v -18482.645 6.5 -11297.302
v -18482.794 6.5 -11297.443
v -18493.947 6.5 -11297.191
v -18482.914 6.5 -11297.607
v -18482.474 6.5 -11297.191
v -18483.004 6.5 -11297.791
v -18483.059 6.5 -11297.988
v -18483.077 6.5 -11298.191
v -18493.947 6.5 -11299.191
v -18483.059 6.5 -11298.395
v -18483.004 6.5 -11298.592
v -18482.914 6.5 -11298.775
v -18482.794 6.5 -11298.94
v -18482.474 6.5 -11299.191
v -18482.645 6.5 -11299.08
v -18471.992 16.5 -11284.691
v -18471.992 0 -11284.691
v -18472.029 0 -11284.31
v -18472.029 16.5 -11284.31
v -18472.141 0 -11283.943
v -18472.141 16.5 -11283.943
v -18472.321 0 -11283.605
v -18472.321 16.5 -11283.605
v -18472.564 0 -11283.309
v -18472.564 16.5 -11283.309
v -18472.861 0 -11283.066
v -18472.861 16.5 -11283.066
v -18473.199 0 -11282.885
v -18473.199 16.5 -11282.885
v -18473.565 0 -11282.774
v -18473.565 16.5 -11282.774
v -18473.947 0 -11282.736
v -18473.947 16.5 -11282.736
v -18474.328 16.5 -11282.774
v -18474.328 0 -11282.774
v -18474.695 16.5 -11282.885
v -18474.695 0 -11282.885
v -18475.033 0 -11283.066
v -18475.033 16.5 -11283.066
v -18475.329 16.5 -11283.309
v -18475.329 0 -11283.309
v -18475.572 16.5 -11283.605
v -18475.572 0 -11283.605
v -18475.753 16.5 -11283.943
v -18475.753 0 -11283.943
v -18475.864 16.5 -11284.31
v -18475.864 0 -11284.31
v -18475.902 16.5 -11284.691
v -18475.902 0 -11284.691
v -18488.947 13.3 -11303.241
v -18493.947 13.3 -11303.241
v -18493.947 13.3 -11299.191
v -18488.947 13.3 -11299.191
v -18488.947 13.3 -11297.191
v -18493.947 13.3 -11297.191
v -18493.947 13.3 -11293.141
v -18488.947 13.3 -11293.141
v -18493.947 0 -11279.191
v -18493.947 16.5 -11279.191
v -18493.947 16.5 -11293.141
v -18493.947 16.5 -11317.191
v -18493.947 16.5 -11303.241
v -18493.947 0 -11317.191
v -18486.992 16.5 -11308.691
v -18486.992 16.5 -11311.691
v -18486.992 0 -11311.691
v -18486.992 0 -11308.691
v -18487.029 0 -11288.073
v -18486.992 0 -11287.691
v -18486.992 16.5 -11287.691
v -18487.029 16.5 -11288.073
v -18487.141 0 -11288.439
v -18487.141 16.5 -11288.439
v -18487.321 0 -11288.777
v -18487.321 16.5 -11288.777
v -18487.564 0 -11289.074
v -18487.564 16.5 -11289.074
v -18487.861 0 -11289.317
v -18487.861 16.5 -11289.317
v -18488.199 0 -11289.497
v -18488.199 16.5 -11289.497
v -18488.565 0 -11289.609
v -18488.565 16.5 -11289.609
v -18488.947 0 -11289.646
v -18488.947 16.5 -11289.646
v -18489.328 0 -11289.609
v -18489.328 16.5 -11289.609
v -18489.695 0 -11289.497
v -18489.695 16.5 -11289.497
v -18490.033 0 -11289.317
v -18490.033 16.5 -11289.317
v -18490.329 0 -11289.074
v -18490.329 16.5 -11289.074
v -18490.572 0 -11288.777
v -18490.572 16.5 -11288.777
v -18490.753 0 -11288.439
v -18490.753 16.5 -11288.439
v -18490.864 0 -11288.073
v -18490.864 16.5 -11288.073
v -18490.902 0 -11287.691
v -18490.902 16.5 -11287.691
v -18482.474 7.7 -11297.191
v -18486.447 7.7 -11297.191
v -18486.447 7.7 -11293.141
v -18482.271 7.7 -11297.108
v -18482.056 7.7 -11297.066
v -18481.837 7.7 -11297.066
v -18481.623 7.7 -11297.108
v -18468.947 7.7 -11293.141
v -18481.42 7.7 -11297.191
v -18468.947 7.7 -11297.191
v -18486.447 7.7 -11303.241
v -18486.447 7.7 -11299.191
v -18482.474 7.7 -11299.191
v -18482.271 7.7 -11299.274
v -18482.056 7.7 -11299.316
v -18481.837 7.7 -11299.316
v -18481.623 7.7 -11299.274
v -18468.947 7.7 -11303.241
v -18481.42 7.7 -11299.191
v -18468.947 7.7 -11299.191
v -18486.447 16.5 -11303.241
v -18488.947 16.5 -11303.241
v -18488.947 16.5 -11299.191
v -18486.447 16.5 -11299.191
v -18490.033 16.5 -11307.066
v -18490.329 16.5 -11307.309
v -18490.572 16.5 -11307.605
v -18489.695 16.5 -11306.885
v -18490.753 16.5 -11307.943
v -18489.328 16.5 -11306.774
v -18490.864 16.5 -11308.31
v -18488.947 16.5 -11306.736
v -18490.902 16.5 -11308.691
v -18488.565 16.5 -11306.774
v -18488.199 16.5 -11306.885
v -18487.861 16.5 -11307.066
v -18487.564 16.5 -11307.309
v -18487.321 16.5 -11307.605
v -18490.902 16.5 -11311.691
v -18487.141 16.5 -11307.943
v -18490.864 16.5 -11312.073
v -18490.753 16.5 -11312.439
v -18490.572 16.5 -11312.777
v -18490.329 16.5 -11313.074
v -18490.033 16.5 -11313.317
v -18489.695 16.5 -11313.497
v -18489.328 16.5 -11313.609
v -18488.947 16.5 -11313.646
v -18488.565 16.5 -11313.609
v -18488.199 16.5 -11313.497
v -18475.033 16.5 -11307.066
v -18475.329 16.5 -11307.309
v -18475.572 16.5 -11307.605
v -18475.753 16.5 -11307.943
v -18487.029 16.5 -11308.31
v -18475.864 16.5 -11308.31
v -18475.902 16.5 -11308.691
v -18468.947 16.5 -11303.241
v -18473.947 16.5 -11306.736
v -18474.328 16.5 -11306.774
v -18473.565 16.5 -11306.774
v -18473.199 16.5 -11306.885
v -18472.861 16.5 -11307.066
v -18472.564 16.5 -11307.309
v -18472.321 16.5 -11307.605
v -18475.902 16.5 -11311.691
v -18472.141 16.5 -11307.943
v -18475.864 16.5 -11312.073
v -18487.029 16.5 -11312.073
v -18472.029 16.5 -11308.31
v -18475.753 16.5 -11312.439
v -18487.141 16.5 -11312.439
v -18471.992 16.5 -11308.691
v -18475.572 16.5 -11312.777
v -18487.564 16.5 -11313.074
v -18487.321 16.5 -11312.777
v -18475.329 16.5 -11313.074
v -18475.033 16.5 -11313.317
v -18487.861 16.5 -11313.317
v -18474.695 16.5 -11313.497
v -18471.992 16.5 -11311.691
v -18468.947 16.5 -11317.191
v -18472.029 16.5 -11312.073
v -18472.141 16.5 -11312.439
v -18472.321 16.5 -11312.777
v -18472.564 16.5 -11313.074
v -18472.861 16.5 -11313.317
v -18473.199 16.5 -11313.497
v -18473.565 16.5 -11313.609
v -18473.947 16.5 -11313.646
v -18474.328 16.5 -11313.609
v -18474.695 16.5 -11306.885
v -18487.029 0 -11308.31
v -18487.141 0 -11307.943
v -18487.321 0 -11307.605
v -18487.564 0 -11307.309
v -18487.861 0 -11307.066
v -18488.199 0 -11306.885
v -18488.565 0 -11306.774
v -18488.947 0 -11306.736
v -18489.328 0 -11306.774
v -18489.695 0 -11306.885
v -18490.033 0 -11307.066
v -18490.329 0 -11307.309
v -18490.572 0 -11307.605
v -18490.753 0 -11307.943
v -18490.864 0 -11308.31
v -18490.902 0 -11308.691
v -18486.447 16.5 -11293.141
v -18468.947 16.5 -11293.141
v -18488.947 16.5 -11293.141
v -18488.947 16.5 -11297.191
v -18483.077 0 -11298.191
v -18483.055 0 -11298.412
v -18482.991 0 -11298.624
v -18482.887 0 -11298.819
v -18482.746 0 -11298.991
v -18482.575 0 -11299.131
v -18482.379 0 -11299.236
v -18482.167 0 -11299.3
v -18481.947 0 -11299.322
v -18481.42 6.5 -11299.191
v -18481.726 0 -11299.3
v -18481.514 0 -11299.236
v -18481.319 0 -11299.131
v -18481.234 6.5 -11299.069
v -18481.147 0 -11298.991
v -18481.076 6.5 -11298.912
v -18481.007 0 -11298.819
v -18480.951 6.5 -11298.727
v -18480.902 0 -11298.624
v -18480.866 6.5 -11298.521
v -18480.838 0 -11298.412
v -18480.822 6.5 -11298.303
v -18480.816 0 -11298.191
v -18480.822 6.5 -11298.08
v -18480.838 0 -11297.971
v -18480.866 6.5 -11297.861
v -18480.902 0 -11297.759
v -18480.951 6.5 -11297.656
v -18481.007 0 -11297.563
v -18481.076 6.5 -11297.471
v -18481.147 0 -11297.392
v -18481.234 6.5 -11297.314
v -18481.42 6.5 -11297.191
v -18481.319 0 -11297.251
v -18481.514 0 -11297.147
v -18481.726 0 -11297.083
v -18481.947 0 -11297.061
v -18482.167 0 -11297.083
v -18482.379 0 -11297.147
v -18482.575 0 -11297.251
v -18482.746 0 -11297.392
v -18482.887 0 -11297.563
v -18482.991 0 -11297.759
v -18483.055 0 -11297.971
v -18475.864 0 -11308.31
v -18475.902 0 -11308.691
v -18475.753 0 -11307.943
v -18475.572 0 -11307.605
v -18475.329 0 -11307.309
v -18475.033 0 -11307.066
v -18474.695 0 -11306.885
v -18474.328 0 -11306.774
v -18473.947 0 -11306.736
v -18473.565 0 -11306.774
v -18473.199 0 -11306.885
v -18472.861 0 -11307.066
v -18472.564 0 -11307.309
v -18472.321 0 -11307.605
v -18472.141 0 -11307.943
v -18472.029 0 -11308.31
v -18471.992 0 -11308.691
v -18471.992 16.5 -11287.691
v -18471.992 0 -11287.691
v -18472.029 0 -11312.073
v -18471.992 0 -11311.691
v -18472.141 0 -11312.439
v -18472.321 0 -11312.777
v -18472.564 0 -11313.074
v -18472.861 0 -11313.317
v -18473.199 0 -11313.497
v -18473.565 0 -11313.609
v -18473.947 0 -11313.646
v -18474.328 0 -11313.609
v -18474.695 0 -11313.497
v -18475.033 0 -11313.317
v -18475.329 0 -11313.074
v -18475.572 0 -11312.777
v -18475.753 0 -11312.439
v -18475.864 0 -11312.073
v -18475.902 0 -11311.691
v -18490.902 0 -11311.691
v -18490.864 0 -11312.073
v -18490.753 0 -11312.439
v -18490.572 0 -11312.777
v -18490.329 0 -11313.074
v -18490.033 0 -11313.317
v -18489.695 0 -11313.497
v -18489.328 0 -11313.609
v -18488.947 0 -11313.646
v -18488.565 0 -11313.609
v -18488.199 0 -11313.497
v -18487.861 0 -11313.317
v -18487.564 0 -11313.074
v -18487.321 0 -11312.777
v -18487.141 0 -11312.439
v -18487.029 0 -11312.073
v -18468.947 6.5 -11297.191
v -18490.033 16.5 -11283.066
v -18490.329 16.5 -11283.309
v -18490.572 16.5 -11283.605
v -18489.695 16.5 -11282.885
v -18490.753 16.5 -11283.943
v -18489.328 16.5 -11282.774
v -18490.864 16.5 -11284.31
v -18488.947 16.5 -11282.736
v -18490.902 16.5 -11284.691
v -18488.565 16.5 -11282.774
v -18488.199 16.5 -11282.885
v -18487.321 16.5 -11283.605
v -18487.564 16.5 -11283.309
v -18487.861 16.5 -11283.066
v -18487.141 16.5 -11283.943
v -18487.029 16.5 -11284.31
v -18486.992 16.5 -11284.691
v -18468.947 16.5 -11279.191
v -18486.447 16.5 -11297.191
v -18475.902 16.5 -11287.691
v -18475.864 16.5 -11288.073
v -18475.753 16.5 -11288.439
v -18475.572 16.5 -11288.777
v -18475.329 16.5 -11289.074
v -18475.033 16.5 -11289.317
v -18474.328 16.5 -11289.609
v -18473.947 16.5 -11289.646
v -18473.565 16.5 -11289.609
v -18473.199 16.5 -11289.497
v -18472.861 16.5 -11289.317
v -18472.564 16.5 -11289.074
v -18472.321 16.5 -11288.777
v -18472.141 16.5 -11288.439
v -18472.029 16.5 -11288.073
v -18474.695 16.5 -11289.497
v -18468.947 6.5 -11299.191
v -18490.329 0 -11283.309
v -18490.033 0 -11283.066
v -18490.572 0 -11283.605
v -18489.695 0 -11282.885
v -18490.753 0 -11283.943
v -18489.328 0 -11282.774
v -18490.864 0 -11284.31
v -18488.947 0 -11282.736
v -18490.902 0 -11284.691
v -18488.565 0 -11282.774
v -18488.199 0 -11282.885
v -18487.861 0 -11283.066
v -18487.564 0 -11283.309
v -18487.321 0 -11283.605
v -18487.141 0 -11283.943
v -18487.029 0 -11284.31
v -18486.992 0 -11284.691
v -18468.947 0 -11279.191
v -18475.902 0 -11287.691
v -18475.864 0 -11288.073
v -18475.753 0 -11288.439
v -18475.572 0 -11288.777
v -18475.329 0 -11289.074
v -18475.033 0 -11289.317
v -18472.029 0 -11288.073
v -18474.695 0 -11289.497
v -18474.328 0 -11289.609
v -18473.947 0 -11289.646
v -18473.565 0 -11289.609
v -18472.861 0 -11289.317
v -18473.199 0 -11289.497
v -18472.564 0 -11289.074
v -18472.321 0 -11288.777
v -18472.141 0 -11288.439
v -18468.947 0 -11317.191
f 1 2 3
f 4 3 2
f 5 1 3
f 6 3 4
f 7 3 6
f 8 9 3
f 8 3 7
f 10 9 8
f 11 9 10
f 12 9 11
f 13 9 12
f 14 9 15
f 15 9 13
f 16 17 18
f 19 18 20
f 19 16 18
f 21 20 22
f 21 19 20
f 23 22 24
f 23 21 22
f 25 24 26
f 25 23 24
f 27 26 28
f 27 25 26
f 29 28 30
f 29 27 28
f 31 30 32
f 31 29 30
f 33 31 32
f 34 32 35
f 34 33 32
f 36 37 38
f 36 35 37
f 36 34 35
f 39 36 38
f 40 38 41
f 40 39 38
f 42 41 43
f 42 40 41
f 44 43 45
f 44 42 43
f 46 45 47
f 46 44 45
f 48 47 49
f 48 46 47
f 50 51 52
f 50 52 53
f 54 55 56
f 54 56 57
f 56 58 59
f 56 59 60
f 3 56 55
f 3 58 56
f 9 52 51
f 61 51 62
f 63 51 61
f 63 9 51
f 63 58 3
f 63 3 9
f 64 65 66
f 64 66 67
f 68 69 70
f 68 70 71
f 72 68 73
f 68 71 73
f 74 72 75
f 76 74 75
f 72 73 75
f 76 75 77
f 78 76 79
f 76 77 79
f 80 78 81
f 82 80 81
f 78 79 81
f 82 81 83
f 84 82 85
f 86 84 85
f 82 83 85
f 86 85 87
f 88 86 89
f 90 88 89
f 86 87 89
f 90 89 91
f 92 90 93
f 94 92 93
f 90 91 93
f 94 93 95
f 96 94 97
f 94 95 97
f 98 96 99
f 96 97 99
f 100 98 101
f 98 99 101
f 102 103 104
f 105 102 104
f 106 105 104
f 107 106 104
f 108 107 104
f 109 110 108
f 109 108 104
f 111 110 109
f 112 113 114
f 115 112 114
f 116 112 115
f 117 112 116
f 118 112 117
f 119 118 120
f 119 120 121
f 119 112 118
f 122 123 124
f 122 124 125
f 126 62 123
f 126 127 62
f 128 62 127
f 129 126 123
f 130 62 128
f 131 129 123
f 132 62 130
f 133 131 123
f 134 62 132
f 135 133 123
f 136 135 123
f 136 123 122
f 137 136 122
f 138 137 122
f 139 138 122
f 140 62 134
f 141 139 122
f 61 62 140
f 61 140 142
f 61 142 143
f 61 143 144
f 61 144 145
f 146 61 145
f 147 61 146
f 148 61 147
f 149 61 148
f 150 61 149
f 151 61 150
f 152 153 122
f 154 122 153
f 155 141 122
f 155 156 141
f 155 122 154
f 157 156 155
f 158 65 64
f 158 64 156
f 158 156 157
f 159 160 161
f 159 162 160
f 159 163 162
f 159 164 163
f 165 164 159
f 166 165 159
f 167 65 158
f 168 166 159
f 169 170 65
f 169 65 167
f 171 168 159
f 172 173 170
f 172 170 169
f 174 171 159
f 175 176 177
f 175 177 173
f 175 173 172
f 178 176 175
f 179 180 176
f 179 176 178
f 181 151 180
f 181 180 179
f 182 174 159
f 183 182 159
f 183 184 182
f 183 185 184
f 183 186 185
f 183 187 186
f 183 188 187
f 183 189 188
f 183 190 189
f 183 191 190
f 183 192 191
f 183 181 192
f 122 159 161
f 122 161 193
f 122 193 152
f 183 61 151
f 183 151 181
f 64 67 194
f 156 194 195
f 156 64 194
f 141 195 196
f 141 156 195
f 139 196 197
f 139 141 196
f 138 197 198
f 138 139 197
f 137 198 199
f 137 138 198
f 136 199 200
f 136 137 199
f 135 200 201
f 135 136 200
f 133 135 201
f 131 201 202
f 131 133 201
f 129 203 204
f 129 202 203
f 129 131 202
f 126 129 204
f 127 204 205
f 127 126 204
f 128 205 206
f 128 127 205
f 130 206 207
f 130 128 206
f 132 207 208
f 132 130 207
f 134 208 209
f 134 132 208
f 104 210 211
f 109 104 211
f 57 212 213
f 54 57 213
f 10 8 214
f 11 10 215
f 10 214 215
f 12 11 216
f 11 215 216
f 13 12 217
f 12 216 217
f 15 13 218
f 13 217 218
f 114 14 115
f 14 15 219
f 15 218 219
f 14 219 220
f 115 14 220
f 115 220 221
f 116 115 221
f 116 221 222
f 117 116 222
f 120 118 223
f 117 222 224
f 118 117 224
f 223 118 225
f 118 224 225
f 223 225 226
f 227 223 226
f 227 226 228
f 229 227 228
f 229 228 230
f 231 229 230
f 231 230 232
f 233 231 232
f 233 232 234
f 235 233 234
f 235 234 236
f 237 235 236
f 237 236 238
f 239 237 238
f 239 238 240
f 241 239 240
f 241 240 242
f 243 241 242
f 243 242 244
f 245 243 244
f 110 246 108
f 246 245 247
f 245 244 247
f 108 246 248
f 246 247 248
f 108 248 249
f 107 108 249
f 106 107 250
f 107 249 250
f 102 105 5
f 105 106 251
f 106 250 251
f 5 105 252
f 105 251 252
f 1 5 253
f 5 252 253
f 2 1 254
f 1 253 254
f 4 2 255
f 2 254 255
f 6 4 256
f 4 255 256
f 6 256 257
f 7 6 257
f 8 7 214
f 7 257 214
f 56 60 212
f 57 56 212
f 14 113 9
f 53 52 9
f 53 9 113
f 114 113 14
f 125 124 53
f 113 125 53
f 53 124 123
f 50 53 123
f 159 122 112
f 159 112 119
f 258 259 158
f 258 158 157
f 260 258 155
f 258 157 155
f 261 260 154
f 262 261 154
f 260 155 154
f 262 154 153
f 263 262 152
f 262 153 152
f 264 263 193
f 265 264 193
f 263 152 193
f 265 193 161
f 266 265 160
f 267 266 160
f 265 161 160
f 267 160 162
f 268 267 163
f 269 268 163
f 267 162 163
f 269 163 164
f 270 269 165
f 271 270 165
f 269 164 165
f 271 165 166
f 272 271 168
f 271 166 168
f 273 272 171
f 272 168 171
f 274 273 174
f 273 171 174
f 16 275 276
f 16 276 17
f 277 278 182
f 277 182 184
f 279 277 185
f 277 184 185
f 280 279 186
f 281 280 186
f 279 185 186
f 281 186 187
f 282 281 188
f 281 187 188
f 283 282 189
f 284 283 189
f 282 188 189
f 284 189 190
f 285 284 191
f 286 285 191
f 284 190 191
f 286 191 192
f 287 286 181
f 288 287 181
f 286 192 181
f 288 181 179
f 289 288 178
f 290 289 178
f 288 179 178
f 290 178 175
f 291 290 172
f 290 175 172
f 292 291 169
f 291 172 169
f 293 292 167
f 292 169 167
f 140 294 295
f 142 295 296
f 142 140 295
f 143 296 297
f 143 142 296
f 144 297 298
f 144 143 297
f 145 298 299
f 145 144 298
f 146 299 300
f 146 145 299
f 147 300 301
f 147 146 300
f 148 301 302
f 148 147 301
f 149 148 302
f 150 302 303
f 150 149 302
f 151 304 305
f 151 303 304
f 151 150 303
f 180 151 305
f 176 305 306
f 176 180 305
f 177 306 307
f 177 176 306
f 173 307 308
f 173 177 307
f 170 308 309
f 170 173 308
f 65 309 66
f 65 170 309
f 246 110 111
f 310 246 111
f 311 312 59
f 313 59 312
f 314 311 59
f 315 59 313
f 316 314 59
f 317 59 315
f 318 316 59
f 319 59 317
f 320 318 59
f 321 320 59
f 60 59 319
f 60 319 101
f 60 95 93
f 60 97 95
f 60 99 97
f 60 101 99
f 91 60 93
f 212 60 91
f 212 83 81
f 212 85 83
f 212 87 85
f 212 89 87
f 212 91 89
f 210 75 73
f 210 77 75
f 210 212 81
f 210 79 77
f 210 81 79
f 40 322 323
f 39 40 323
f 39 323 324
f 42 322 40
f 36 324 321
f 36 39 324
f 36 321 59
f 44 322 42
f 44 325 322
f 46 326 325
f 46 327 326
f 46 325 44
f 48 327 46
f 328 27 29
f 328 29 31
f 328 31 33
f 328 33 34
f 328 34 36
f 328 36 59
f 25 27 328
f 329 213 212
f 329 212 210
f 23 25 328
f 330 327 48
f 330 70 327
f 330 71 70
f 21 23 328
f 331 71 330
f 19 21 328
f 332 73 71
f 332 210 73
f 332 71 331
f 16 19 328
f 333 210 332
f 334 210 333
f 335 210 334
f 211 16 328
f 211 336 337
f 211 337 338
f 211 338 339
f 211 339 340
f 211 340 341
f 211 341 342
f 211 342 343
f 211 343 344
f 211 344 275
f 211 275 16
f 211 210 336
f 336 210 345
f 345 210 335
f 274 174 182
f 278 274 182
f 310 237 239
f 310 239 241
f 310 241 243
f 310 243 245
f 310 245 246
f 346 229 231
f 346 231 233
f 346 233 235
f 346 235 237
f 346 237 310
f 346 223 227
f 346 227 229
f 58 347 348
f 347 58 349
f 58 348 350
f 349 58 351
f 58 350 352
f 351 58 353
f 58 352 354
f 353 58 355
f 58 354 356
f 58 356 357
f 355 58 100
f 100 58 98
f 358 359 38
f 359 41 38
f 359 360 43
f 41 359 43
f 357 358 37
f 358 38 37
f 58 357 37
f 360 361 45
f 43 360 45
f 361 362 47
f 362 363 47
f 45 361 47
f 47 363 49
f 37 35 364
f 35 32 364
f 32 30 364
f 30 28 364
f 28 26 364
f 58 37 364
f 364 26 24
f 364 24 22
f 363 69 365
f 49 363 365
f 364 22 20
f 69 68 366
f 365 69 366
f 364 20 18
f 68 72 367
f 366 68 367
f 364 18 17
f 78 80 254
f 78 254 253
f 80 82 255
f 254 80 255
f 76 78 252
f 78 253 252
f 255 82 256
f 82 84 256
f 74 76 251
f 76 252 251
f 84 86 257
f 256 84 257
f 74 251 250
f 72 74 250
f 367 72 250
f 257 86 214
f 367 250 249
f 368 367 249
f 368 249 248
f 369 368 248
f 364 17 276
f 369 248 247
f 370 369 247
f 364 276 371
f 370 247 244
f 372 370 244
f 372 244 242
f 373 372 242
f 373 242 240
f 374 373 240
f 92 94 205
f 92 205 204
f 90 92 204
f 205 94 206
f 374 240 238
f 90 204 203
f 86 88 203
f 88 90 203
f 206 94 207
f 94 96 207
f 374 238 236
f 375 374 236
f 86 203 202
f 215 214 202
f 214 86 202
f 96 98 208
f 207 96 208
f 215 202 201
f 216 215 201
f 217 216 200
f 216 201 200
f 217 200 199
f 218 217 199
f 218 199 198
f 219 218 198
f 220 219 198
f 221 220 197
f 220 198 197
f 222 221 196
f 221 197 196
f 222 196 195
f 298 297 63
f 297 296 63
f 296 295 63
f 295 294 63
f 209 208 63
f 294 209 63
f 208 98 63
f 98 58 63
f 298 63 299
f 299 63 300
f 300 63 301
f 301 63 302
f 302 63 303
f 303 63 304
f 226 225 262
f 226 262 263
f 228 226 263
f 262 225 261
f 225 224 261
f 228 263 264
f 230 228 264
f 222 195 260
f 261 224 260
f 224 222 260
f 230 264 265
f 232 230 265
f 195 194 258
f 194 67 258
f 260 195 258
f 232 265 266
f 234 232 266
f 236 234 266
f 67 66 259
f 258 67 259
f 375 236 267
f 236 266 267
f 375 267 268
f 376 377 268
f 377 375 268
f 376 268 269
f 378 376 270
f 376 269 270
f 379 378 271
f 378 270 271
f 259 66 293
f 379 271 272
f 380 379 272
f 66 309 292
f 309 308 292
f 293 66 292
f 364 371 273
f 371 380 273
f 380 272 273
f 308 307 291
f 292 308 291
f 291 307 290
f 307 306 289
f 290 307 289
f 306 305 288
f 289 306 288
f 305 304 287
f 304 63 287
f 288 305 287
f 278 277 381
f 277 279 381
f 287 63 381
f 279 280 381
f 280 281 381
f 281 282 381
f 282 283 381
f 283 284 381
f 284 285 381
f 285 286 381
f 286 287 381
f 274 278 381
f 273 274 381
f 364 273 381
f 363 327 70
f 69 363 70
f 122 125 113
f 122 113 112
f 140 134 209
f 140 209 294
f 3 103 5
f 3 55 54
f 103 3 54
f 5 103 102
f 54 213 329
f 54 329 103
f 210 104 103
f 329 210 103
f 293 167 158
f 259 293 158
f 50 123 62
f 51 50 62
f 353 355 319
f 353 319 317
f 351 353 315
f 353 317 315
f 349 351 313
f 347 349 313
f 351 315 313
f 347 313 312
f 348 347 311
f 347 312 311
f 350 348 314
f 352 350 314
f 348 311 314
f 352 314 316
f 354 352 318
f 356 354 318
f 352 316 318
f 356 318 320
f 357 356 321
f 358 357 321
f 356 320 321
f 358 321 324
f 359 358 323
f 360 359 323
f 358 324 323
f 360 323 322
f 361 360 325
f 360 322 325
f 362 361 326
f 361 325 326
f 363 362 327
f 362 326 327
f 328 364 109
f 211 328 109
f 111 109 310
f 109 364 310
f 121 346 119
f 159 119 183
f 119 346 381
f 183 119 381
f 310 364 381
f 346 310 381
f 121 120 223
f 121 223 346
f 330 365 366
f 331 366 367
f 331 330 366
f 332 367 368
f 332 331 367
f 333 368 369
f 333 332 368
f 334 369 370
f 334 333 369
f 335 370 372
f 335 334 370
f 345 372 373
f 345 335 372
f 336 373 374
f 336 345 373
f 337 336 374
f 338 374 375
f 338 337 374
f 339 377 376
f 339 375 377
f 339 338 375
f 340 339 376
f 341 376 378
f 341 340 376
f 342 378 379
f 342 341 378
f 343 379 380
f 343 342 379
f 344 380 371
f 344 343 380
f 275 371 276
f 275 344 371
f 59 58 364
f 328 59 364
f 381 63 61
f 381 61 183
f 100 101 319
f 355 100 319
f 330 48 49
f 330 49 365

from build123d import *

# Parameters (mm, degrees)
SKETCH1_W               = 25
SKETCH1_H               = 38
BOSS_EXTRUDE1_DEPTH     = 16.5
F_6_32_SLOTS_DEPTH      = 17.5
SKETCH2_11_W            = 5
SKETCH2_11_H            = 5.05
LENS_SEAT_DEPTH         = 3.2
SKETCH2_13_W            = 17.5
SKETCH2_13_H            = 10.1
LENS_PLATE_GROOVE_DEPTH = 8.8
SKETCH6_W               = 25
SKETCH6_H               = 2
ALIGNMENT_GROOVE_DEPTH  = 10
F_4_40_TAPPED_HOLE2_D   = 2.2606


with BuildPart() as part:
    # Sketch1 → Boss-Extrude1 (new body)
    with BuildSketch(Plane(origin=(0, 0, 0), x_dir=(1, 0, 0), z_dir=(0, 1, 0))):
        with Locations((-18481.446731235, 11298.191283293)):
            Rectangle(SKETCH1_W, SKETCH1_H)
    extrude(amount=BOSS_EXTRUDE1_DEPTH)

    # Sketch2 → 6-32 slots (cut, through all)
    with BuildSketch(Plane(origin=(0, 16.5, 0), x_dir=(1, 0, 0), z_dir=(0, 1, 0))):
        with BuildLine():
            Line((-18486.991731235, 11311.691283293), (-18486.991731235, 11308.691283293))
            ThreePointArc((-18486.991731235, 11308.691283293), (-18488.946731235, 11306.736283293), (-18490.901731235, 11308.691283293))
            Line((-18490.901731235, 11308.691283293), (-18490.901731235, 11311.691283293))
            ThreePointArc((-18490.901731235, 11311.691283293), (-18488.946731235, 11313.646283293), (-18486.991731235, 11311.691283293))
        make_face()
        with BuildLine():
            Line((-18486.991731235, 11284.691283293), (-18486.991731235, 11287.691283293))
            ThreePointArc((-18486.991731235, 11287.691283293), (-18488.946731235, 11289.646283293), (-18490.901731235, 11287.691283293))
            Line((-18490.901731235, 11287.691283293), (-18490.901731235, 11284.691283293))
            ThreePointArc((-18490.901731235, 11284.691283293), (-18488.946731235, 11282.736283293), (-18486.991731235, 11284.691283293))
        make_face()
        with BuildLine():
            Line((-18475.901731235, 11284.691283293), (-18475.901731235, 11287.691283293))
            ThreePointArc((-18475.901731235, 11287.691283293), (-18473.946731235, 11289.646283293), (-18471.991731235, 11287.691283293))
            Line((-18471.991731235, 11287.691283293), (-18471.991731235, 11284.691283293))
            ThreePointArc((-18471.991731235, 11284.691283293), (-18473.946731235, 11282.736283293), (-18475.901731235, 11284.691283293))
        make_face()
        with BuildLine():
            Line((-18475.901731235, 11311.691283293), (-18475.901731235, 11308.691283293))
            ThreePointArc((-18475.901731235, 11308.691283293), (-18473.946731235, 11306.736283293), (-18471.991731235, 11308.691283293))
            Line((-18471.991731235, 11308.691283293), (-18471.991731235, 11311.691283293))
            ThreePointArc((-18471.991731235, 11311.691283293), (-18473.946731235, 11313.646283293), (-18475.901731235, 11311.691283293))
        make_face()
    extrude(amount=-F_6_32_SLOTS_DEPTH, mode=Mode.SUBTRACT)

    # Sketch2<11> → lens seat (cut)
    with BuildSketch(Plane(origin=(0, 16.5, 0), x_dir=(1, 0, 0), z_dir=(0, 1, 0))):
        Polygon((-18493.946731235, 11300.191283293), (-18493.946731235, 11298.191283293), (-18488.946731235, 11298.191283293), (-18488.946731235, 11303.241283293), (-18493.946731235, 11303.241283293), align=None)
        with Locations((-18491.446731235, 11295.666283293)):
            Rectangle(SKETCH2_11_W, SKETCH2_11_H)
    extrude(amount=-LENS_SEAT_DEPTH, mode=Mode.SUBTRACT)

    # Sketch2<13> → lens plate groove (cut)
    with BuildSketch(Plane(origin=(0, 16.5, 0), x_dir=(1, 0, 0), z_dir=(0, 1, 0))):
        with Locations((-18477.696731235, 11298.191283293)):
            Rectangle(SKETCH2_13_W, SKETCH2_13_H)
    extrude(amount=-LENS_PLATE_GROOVE_DEPTH, mode=Mode.SUBTRACT)

    # Sketch6 → alignment groove (cut)
    with BuildSketch(Plane(origin=(0, 16.5, 0), x_dir=(1, 0, 0), z_dir=(0, 1, 0))):
        with Locations((-18481.446731235, 11298.191283293)):
            Rectangle(SKETCH6_W, SKETCH6_H)
    extrude(amount=-ALIGNMENT_GROOVE_DEPTH, mode=Mode.SUBTRACT)

    # #4-40 Tapped Hole2 (through all)
    with Locations(Plane(origin=(0, 7.7, 0), x_dir=(1, 0, 0), z_dir=(0, 1, 0))):
        with Locations((-18481.946731235, 11298.191283293)):
            Hole(F_4_40_TAPPED_HOLE2_D / 2)


solid = part.part
